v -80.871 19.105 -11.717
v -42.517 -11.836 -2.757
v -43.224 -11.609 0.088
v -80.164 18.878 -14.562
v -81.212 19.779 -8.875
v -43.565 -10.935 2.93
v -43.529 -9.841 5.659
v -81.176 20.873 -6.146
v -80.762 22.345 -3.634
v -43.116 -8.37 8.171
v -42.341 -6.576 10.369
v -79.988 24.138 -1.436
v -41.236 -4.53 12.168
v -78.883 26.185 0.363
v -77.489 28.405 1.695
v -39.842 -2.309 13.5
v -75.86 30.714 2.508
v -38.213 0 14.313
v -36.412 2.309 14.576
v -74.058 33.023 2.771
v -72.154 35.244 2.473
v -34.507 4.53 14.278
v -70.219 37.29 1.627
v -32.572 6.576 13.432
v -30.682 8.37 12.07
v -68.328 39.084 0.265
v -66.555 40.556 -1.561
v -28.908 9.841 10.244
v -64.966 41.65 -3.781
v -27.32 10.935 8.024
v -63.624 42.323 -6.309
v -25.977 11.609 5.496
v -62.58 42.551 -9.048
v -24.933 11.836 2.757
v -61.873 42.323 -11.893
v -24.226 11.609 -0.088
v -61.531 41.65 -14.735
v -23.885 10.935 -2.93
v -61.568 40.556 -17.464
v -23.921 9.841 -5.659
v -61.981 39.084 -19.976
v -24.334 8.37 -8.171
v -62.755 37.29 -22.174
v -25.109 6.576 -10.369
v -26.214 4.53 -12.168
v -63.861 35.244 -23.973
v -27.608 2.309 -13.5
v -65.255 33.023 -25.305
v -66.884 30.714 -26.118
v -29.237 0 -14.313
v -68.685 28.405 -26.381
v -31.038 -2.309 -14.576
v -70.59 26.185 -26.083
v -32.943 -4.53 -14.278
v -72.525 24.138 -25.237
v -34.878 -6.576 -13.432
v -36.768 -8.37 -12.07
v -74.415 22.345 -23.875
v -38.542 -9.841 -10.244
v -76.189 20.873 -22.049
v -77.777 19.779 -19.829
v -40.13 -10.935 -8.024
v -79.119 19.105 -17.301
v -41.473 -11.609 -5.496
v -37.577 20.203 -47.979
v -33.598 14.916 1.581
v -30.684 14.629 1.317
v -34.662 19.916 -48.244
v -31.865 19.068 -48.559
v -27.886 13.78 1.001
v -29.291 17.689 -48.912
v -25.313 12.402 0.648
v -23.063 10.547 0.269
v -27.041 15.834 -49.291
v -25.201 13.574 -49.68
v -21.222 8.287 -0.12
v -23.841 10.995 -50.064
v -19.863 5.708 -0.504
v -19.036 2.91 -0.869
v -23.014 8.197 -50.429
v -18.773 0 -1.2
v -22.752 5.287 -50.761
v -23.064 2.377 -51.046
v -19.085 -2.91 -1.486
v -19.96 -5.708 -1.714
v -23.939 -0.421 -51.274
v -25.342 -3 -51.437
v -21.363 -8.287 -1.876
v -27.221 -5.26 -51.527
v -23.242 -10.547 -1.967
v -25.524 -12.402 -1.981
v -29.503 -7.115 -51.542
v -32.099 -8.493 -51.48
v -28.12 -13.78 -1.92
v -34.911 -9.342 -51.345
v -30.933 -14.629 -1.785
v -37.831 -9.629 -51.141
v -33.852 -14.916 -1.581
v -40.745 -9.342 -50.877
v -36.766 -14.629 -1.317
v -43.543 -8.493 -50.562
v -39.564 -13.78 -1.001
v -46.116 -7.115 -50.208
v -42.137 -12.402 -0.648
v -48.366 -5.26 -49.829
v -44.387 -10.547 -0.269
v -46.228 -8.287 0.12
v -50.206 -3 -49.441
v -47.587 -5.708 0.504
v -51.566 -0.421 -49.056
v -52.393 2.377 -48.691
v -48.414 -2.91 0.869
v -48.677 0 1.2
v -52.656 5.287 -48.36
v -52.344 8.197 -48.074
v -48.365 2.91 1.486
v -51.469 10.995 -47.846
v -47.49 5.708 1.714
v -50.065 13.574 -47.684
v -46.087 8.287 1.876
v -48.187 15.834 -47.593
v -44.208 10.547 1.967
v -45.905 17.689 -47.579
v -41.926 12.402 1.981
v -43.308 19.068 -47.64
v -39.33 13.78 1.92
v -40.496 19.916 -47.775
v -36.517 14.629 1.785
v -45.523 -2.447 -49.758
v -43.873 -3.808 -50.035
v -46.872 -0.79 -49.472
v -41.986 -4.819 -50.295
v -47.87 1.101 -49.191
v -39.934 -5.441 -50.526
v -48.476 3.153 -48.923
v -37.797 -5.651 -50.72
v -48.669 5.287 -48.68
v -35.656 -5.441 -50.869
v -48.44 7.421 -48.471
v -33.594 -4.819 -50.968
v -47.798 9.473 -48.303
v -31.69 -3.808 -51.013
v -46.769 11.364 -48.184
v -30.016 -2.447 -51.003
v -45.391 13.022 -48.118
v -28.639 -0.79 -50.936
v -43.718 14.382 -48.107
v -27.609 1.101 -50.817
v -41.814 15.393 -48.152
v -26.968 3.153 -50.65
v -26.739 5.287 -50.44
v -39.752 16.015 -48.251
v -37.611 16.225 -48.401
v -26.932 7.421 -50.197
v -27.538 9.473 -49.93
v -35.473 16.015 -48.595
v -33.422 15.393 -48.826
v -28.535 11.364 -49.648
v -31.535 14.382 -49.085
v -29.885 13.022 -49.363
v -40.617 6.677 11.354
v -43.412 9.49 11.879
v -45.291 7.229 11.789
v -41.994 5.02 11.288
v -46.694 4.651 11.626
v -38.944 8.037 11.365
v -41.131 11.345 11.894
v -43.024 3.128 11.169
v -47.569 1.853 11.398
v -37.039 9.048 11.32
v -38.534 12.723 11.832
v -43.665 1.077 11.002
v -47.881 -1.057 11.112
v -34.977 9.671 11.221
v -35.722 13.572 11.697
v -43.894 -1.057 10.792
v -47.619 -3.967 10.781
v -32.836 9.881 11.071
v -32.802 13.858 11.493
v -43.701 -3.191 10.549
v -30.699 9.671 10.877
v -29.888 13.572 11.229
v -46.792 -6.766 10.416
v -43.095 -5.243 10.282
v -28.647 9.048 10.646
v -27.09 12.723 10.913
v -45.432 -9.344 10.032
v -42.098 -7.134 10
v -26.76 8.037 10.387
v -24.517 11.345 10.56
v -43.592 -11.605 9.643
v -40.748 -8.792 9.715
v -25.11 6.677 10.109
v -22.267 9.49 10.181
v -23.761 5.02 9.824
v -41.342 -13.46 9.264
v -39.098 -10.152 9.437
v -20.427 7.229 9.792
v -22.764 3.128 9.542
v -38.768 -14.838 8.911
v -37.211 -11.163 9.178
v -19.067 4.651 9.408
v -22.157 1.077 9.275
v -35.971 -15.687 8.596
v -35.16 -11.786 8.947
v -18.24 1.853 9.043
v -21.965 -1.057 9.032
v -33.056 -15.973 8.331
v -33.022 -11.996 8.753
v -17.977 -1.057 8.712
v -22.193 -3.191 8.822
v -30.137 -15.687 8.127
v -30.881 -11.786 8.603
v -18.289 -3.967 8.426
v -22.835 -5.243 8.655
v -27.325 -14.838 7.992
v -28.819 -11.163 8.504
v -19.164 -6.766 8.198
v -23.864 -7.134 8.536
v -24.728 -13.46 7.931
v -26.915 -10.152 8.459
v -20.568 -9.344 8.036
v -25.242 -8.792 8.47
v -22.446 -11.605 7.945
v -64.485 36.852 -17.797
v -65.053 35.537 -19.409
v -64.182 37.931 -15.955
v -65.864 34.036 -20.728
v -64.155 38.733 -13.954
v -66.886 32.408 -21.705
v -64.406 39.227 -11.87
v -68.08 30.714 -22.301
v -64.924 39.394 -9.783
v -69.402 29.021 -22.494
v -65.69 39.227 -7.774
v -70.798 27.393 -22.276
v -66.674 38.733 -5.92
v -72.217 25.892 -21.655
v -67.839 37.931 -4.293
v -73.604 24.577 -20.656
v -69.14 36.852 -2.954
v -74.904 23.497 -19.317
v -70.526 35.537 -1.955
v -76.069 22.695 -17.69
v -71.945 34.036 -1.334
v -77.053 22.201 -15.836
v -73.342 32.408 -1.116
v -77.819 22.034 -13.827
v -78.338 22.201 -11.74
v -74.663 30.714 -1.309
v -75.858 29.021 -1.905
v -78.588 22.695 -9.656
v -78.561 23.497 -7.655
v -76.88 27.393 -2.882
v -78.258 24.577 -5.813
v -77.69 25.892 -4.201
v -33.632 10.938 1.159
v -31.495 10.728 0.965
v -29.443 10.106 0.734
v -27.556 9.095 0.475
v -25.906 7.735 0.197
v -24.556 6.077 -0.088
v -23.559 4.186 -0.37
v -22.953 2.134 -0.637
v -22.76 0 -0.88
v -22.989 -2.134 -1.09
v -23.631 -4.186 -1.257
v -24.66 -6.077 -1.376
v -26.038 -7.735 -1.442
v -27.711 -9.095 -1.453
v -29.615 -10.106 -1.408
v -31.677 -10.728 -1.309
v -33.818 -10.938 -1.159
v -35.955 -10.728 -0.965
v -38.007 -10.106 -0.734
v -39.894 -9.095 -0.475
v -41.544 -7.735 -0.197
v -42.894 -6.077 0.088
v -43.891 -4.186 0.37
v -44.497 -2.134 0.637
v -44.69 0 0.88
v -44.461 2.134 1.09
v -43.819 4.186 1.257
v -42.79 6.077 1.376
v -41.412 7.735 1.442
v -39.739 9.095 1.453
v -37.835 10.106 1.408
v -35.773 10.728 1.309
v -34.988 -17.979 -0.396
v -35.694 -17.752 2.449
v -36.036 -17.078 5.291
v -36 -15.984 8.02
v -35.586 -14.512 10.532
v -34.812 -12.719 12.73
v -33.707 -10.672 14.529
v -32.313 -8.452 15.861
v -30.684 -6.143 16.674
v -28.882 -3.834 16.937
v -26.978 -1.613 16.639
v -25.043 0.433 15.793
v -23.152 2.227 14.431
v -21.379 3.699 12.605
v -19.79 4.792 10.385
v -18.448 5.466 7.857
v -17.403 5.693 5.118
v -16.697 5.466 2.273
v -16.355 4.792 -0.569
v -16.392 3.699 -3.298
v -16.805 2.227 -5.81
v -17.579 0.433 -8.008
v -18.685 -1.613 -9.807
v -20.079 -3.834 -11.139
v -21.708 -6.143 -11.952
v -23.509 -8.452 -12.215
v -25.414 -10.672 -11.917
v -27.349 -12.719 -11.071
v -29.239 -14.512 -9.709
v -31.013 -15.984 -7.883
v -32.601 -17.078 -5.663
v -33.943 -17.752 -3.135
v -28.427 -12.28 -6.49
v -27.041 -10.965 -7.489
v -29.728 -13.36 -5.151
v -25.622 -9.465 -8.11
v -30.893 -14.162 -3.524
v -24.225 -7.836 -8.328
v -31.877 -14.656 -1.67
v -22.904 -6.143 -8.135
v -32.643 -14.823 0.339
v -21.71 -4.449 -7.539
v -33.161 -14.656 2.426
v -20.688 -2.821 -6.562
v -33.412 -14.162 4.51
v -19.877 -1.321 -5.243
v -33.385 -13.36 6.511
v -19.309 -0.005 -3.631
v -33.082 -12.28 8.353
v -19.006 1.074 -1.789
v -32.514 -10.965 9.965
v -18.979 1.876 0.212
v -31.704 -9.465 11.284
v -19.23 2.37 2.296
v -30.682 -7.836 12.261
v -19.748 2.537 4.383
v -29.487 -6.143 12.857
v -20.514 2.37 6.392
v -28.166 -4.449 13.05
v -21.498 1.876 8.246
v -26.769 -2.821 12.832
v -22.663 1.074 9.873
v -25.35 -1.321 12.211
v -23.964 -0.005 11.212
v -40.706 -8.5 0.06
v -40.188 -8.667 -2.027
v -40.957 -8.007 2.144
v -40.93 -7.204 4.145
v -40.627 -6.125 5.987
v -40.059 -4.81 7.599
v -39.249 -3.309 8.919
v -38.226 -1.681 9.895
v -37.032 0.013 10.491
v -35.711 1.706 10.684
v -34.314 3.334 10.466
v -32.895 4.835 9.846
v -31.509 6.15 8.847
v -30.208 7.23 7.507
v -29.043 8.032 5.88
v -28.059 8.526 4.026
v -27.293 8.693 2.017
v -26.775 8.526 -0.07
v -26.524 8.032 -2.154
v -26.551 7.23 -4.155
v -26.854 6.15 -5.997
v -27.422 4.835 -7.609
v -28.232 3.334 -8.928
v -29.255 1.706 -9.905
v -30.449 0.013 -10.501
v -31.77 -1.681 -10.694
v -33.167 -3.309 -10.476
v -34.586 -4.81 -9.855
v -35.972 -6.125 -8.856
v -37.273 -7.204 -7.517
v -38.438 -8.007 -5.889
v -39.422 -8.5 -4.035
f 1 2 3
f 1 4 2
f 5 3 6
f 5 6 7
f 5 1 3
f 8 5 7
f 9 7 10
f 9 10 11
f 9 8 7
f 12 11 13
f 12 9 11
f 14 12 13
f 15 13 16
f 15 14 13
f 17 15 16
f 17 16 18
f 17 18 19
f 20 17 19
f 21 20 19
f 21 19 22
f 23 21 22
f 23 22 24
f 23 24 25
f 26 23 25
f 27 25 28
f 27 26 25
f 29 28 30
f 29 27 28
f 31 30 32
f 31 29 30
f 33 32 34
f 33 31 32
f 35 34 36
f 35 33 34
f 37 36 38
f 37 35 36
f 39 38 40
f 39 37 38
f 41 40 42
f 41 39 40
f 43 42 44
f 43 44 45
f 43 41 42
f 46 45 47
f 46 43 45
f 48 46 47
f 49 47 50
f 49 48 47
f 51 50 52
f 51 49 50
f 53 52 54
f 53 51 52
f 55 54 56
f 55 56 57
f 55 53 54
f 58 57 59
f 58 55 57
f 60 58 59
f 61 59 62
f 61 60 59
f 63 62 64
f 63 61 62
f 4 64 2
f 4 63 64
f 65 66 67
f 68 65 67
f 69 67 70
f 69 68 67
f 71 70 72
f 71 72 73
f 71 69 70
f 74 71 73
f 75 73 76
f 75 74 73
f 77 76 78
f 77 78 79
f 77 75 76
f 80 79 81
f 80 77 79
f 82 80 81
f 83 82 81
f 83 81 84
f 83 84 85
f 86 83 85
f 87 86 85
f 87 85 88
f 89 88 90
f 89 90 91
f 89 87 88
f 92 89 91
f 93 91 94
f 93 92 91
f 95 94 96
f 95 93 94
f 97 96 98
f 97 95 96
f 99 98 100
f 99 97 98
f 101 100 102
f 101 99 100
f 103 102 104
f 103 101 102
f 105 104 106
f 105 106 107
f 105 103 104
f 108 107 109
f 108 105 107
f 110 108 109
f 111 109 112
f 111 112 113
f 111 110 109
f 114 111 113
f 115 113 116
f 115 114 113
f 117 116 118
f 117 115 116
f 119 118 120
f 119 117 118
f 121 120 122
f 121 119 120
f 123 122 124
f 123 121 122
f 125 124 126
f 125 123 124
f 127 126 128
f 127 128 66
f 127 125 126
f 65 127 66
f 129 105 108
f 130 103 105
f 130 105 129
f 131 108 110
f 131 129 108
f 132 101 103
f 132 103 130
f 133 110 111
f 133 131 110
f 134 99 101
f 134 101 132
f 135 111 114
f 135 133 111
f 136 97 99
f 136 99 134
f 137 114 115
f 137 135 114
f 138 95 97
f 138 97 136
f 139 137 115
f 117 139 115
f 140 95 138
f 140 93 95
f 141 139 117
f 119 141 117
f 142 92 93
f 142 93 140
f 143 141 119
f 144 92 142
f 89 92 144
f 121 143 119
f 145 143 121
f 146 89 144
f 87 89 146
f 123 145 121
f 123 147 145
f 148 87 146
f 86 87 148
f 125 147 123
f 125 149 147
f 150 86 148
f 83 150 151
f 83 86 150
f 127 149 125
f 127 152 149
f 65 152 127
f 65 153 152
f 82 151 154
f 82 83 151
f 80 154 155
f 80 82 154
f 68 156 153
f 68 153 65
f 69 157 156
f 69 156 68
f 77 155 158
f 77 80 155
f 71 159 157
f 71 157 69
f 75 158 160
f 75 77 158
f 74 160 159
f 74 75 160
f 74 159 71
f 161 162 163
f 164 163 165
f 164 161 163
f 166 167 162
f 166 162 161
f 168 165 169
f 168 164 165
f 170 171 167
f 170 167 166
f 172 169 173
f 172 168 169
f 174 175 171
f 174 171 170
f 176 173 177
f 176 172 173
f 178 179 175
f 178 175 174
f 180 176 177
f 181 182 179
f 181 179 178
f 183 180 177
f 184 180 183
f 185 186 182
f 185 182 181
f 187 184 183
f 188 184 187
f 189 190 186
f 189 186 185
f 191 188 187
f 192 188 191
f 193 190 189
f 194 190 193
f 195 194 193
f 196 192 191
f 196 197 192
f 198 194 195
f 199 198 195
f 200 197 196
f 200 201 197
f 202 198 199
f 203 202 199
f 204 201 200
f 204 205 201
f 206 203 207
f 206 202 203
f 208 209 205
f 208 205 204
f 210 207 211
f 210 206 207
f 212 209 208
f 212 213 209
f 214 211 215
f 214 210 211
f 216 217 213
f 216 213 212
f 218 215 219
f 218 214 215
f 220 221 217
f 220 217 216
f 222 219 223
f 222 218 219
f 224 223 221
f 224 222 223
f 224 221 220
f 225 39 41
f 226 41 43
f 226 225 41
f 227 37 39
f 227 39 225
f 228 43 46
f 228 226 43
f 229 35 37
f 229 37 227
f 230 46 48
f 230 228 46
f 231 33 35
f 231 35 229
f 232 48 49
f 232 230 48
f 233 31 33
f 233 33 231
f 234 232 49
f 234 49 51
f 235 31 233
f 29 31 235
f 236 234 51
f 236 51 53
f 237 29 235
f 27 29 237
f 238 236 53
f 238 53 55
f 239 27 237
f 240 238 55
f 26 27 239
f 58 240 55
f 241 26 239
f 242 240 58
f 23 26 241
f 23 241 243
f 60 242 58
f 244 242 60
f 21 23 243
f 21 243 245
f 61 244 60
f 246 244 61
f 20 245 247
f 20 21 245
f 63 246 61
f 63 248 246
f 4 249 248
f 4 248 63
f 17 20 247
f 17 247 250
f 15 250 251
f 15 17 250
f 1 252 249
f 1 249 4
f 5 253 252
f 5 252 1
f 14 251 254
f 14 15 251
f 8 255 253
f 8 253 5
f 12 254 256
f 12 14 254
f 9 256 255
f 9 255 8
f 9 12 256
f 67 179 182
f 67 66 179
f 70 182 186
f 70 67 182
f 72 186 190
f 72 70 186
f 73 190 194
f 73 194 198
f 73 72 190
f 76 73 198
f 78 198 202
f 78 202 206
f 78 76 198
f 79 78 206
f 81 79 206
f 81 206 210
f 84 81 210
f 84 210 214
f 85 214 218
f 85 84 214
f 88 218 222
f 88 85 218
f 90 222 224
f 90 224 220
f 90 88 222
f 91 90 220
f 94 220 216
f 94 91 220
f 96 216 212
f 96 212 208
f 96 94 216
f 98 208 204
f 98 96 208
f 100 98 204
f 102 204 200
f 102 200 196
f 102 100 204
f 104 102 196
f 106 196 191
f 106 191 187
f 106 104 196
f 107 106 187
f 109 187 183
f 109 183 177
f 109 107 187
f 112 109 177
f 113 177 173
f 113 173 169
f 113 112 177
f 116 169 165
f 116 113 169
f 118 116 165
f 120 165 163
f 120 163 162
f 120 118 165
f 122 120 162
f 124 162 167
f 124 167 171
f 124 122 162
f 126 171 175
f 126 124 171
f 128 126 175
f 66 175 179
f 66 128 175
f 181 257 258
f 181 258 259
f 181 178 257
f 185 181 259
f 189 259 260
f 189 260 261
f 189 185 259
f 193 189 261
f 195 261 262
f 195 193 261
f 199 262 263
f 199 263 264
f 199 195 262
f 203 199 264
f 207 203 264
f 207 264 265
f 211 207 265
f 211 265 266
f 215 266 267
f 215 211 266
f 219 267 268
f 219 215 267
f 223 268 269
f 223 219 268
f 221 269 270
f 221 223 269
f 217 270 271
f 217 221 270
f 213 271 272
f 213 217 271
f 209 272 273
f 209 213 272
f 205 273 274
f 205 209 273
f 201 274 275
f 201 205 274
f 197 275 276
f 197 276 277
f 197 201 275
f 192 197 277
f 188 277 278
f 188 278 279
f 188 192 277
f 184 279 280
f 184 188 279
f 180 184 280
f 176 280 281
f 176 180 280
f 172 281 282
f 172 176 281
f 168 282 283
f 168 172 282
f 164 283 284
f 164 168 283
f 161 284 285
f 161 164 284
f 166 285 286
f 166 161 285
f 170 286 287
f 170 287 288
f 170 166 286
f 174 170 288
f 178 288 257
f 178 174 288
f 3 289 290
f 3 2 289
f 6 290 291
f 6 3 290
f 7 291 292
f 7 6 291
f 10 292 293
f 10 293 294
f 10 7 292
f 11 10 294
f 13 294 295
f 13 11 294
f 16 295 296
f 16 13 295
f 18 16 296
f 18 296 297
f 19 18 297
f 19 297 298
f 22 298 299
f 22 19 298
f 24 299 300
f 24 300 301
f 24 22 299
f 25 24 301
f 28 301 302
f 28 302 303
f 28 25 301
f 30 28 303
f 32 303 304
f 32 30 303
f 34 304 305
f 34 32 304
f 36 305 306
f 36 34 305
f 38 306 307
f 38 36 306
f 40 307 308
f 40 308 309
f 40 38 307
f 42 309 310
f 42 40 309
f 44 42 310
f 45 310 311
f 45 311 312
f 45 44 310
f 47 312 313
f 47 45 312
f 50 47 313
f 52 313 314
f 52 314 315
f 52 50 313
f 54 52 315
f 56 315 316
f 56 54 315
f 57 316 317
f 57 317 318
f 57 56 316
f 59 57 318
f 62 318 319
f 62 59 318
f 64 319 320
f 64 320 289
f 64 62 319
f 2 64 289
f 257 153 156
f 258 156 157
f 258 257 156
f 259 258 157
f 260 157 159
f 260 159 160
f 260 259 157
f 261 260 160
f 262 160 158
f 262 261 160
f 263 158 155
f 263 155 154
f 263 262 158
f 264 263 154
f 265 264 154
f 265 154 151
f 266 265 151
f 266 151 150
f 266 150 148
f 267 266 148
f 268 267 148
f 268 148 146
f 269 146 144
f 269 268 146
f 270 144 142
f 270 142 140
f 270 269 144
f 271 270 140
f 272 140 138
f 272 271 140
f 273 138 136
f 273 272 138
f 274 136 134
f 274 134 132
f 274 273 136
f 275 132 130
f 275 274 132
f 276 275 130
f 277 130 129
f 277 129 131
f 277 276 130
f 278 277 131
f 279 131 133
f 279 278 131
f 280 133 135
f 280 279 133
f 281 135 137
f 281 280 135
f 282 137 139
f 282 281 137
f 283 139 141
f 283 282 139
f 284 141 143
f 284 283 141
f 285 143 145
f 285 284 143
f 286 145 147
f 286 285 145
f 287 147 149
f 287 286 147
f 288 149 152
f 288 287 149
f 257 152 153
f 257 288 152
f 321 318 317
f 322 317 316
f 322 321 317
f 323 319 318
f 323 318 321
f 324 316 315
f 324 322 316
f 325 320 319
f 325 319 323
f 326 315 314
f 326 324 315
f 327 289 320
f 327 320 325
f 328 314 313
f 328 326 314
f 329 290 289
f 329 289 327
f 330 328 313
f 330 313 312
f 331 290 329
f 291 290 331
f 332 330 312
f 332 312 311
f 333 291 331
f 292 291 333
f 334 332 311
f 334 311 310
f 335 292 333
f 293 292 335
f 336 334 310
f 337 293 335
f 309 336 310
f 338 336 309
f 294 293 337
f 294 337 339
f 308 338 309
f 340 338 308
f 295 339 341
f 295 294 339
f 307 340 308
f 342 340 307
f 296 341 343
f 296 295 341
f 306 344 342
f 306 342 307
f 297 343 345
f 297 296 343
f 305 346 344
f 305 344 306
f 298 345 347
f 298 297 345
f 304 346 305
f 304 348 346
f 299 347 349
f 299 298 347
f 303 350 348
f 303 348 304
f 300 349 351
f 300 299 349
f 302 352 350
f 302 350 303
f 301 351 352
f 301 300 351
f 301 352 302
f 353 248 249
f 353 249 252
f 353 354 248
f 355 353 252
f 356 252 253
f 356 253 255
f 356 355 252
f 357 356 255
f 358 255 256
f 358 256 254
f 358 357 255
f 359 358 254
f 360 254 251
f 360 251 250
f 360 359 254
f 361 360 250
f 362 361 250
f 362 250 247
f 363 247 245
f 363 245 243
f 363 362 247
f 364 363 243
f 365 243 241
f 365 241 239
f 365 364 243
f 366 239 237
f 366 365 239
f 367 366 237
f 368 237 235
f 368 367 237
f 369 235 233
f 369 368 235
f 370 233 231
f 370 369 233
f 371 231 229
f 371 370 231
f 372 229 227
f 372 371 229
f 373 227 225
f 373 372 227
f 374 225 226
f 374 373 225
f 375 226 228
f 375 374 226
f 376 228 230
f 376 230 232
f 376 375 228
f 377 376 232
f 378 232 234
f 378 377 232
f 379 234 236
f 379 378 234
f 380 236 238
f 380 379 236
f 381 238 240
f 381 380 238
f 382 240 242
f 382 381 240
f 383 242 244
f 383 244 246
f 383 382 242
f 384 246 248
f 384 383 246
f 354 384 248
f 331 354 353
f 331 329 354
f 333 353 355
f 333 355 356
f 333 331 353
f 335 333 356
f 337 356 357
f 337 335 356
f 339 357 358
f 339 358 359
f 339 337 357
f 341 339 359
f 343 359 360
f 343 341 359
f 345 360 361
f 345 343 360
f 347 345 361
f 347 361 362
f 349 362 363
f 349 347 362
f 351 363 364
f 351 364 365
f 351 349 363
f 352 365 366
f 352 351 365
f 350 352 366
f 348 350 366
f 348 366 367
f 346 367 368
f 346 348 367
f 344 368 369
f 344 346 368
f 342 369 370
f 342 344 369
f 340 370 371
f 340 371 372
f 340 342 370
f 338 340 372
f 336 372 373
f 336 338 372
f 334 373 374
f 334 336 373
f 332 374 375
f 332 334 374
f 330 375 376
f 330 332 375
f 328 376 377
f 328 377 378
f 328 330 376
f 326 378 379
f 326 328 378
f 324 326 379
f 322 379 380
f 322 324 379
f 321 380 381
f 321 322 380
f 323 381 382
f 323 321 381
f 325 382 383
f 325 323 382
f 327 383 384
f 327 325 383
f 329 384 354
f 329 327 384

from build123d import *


with BuildPart() as part:
    # Sketch12 → Revolve3 (revolve)
    with BuildSketch(Plane(origin=(-33.509025336, 0, 2.690185958), x_dir=(-0.080024952, 0, -0.996792861), z_dir=(0.996792861, 0, -0.080024952))):
        Polygon((1.112690179, 14.915901713), (50.832362557, 20.203072847), (51.255336248, 16.225499056), (1.53566387, 10.938327923), (-8.408270606, 9.880893697), (-8.831244297, 13.858467487), align=None)
    revolve(axis=Axis((-33.725, 0, 0), (-0.079576288, 0.105743423, -0.991204289)))


with BuildPart() as body_2:
    # Sketch11 → Revolve2 (revolve)
    with BuildSketch(Plane(origin=(-3.019231595, 0, 9.628490334), x_dir=(-0.954188122, 0, -0.299207334), z_dir=(0.299207334, 0, -0.954188122))):
        Polygon((41.3942724, -11.836261273), (80.848476641, 18.877998732), (78.391335841, 22.034335072), (38.953432988, -8.667234648), (31.046290751, -14.822776934), (33.503431551, -17.979113274), align=None)
    revolve(axis=Axis((-33.725, 0, 0), (-0.752934661, 0.6142852, -0.236099745)))


solid = Compound([part.part, body_2.part])
